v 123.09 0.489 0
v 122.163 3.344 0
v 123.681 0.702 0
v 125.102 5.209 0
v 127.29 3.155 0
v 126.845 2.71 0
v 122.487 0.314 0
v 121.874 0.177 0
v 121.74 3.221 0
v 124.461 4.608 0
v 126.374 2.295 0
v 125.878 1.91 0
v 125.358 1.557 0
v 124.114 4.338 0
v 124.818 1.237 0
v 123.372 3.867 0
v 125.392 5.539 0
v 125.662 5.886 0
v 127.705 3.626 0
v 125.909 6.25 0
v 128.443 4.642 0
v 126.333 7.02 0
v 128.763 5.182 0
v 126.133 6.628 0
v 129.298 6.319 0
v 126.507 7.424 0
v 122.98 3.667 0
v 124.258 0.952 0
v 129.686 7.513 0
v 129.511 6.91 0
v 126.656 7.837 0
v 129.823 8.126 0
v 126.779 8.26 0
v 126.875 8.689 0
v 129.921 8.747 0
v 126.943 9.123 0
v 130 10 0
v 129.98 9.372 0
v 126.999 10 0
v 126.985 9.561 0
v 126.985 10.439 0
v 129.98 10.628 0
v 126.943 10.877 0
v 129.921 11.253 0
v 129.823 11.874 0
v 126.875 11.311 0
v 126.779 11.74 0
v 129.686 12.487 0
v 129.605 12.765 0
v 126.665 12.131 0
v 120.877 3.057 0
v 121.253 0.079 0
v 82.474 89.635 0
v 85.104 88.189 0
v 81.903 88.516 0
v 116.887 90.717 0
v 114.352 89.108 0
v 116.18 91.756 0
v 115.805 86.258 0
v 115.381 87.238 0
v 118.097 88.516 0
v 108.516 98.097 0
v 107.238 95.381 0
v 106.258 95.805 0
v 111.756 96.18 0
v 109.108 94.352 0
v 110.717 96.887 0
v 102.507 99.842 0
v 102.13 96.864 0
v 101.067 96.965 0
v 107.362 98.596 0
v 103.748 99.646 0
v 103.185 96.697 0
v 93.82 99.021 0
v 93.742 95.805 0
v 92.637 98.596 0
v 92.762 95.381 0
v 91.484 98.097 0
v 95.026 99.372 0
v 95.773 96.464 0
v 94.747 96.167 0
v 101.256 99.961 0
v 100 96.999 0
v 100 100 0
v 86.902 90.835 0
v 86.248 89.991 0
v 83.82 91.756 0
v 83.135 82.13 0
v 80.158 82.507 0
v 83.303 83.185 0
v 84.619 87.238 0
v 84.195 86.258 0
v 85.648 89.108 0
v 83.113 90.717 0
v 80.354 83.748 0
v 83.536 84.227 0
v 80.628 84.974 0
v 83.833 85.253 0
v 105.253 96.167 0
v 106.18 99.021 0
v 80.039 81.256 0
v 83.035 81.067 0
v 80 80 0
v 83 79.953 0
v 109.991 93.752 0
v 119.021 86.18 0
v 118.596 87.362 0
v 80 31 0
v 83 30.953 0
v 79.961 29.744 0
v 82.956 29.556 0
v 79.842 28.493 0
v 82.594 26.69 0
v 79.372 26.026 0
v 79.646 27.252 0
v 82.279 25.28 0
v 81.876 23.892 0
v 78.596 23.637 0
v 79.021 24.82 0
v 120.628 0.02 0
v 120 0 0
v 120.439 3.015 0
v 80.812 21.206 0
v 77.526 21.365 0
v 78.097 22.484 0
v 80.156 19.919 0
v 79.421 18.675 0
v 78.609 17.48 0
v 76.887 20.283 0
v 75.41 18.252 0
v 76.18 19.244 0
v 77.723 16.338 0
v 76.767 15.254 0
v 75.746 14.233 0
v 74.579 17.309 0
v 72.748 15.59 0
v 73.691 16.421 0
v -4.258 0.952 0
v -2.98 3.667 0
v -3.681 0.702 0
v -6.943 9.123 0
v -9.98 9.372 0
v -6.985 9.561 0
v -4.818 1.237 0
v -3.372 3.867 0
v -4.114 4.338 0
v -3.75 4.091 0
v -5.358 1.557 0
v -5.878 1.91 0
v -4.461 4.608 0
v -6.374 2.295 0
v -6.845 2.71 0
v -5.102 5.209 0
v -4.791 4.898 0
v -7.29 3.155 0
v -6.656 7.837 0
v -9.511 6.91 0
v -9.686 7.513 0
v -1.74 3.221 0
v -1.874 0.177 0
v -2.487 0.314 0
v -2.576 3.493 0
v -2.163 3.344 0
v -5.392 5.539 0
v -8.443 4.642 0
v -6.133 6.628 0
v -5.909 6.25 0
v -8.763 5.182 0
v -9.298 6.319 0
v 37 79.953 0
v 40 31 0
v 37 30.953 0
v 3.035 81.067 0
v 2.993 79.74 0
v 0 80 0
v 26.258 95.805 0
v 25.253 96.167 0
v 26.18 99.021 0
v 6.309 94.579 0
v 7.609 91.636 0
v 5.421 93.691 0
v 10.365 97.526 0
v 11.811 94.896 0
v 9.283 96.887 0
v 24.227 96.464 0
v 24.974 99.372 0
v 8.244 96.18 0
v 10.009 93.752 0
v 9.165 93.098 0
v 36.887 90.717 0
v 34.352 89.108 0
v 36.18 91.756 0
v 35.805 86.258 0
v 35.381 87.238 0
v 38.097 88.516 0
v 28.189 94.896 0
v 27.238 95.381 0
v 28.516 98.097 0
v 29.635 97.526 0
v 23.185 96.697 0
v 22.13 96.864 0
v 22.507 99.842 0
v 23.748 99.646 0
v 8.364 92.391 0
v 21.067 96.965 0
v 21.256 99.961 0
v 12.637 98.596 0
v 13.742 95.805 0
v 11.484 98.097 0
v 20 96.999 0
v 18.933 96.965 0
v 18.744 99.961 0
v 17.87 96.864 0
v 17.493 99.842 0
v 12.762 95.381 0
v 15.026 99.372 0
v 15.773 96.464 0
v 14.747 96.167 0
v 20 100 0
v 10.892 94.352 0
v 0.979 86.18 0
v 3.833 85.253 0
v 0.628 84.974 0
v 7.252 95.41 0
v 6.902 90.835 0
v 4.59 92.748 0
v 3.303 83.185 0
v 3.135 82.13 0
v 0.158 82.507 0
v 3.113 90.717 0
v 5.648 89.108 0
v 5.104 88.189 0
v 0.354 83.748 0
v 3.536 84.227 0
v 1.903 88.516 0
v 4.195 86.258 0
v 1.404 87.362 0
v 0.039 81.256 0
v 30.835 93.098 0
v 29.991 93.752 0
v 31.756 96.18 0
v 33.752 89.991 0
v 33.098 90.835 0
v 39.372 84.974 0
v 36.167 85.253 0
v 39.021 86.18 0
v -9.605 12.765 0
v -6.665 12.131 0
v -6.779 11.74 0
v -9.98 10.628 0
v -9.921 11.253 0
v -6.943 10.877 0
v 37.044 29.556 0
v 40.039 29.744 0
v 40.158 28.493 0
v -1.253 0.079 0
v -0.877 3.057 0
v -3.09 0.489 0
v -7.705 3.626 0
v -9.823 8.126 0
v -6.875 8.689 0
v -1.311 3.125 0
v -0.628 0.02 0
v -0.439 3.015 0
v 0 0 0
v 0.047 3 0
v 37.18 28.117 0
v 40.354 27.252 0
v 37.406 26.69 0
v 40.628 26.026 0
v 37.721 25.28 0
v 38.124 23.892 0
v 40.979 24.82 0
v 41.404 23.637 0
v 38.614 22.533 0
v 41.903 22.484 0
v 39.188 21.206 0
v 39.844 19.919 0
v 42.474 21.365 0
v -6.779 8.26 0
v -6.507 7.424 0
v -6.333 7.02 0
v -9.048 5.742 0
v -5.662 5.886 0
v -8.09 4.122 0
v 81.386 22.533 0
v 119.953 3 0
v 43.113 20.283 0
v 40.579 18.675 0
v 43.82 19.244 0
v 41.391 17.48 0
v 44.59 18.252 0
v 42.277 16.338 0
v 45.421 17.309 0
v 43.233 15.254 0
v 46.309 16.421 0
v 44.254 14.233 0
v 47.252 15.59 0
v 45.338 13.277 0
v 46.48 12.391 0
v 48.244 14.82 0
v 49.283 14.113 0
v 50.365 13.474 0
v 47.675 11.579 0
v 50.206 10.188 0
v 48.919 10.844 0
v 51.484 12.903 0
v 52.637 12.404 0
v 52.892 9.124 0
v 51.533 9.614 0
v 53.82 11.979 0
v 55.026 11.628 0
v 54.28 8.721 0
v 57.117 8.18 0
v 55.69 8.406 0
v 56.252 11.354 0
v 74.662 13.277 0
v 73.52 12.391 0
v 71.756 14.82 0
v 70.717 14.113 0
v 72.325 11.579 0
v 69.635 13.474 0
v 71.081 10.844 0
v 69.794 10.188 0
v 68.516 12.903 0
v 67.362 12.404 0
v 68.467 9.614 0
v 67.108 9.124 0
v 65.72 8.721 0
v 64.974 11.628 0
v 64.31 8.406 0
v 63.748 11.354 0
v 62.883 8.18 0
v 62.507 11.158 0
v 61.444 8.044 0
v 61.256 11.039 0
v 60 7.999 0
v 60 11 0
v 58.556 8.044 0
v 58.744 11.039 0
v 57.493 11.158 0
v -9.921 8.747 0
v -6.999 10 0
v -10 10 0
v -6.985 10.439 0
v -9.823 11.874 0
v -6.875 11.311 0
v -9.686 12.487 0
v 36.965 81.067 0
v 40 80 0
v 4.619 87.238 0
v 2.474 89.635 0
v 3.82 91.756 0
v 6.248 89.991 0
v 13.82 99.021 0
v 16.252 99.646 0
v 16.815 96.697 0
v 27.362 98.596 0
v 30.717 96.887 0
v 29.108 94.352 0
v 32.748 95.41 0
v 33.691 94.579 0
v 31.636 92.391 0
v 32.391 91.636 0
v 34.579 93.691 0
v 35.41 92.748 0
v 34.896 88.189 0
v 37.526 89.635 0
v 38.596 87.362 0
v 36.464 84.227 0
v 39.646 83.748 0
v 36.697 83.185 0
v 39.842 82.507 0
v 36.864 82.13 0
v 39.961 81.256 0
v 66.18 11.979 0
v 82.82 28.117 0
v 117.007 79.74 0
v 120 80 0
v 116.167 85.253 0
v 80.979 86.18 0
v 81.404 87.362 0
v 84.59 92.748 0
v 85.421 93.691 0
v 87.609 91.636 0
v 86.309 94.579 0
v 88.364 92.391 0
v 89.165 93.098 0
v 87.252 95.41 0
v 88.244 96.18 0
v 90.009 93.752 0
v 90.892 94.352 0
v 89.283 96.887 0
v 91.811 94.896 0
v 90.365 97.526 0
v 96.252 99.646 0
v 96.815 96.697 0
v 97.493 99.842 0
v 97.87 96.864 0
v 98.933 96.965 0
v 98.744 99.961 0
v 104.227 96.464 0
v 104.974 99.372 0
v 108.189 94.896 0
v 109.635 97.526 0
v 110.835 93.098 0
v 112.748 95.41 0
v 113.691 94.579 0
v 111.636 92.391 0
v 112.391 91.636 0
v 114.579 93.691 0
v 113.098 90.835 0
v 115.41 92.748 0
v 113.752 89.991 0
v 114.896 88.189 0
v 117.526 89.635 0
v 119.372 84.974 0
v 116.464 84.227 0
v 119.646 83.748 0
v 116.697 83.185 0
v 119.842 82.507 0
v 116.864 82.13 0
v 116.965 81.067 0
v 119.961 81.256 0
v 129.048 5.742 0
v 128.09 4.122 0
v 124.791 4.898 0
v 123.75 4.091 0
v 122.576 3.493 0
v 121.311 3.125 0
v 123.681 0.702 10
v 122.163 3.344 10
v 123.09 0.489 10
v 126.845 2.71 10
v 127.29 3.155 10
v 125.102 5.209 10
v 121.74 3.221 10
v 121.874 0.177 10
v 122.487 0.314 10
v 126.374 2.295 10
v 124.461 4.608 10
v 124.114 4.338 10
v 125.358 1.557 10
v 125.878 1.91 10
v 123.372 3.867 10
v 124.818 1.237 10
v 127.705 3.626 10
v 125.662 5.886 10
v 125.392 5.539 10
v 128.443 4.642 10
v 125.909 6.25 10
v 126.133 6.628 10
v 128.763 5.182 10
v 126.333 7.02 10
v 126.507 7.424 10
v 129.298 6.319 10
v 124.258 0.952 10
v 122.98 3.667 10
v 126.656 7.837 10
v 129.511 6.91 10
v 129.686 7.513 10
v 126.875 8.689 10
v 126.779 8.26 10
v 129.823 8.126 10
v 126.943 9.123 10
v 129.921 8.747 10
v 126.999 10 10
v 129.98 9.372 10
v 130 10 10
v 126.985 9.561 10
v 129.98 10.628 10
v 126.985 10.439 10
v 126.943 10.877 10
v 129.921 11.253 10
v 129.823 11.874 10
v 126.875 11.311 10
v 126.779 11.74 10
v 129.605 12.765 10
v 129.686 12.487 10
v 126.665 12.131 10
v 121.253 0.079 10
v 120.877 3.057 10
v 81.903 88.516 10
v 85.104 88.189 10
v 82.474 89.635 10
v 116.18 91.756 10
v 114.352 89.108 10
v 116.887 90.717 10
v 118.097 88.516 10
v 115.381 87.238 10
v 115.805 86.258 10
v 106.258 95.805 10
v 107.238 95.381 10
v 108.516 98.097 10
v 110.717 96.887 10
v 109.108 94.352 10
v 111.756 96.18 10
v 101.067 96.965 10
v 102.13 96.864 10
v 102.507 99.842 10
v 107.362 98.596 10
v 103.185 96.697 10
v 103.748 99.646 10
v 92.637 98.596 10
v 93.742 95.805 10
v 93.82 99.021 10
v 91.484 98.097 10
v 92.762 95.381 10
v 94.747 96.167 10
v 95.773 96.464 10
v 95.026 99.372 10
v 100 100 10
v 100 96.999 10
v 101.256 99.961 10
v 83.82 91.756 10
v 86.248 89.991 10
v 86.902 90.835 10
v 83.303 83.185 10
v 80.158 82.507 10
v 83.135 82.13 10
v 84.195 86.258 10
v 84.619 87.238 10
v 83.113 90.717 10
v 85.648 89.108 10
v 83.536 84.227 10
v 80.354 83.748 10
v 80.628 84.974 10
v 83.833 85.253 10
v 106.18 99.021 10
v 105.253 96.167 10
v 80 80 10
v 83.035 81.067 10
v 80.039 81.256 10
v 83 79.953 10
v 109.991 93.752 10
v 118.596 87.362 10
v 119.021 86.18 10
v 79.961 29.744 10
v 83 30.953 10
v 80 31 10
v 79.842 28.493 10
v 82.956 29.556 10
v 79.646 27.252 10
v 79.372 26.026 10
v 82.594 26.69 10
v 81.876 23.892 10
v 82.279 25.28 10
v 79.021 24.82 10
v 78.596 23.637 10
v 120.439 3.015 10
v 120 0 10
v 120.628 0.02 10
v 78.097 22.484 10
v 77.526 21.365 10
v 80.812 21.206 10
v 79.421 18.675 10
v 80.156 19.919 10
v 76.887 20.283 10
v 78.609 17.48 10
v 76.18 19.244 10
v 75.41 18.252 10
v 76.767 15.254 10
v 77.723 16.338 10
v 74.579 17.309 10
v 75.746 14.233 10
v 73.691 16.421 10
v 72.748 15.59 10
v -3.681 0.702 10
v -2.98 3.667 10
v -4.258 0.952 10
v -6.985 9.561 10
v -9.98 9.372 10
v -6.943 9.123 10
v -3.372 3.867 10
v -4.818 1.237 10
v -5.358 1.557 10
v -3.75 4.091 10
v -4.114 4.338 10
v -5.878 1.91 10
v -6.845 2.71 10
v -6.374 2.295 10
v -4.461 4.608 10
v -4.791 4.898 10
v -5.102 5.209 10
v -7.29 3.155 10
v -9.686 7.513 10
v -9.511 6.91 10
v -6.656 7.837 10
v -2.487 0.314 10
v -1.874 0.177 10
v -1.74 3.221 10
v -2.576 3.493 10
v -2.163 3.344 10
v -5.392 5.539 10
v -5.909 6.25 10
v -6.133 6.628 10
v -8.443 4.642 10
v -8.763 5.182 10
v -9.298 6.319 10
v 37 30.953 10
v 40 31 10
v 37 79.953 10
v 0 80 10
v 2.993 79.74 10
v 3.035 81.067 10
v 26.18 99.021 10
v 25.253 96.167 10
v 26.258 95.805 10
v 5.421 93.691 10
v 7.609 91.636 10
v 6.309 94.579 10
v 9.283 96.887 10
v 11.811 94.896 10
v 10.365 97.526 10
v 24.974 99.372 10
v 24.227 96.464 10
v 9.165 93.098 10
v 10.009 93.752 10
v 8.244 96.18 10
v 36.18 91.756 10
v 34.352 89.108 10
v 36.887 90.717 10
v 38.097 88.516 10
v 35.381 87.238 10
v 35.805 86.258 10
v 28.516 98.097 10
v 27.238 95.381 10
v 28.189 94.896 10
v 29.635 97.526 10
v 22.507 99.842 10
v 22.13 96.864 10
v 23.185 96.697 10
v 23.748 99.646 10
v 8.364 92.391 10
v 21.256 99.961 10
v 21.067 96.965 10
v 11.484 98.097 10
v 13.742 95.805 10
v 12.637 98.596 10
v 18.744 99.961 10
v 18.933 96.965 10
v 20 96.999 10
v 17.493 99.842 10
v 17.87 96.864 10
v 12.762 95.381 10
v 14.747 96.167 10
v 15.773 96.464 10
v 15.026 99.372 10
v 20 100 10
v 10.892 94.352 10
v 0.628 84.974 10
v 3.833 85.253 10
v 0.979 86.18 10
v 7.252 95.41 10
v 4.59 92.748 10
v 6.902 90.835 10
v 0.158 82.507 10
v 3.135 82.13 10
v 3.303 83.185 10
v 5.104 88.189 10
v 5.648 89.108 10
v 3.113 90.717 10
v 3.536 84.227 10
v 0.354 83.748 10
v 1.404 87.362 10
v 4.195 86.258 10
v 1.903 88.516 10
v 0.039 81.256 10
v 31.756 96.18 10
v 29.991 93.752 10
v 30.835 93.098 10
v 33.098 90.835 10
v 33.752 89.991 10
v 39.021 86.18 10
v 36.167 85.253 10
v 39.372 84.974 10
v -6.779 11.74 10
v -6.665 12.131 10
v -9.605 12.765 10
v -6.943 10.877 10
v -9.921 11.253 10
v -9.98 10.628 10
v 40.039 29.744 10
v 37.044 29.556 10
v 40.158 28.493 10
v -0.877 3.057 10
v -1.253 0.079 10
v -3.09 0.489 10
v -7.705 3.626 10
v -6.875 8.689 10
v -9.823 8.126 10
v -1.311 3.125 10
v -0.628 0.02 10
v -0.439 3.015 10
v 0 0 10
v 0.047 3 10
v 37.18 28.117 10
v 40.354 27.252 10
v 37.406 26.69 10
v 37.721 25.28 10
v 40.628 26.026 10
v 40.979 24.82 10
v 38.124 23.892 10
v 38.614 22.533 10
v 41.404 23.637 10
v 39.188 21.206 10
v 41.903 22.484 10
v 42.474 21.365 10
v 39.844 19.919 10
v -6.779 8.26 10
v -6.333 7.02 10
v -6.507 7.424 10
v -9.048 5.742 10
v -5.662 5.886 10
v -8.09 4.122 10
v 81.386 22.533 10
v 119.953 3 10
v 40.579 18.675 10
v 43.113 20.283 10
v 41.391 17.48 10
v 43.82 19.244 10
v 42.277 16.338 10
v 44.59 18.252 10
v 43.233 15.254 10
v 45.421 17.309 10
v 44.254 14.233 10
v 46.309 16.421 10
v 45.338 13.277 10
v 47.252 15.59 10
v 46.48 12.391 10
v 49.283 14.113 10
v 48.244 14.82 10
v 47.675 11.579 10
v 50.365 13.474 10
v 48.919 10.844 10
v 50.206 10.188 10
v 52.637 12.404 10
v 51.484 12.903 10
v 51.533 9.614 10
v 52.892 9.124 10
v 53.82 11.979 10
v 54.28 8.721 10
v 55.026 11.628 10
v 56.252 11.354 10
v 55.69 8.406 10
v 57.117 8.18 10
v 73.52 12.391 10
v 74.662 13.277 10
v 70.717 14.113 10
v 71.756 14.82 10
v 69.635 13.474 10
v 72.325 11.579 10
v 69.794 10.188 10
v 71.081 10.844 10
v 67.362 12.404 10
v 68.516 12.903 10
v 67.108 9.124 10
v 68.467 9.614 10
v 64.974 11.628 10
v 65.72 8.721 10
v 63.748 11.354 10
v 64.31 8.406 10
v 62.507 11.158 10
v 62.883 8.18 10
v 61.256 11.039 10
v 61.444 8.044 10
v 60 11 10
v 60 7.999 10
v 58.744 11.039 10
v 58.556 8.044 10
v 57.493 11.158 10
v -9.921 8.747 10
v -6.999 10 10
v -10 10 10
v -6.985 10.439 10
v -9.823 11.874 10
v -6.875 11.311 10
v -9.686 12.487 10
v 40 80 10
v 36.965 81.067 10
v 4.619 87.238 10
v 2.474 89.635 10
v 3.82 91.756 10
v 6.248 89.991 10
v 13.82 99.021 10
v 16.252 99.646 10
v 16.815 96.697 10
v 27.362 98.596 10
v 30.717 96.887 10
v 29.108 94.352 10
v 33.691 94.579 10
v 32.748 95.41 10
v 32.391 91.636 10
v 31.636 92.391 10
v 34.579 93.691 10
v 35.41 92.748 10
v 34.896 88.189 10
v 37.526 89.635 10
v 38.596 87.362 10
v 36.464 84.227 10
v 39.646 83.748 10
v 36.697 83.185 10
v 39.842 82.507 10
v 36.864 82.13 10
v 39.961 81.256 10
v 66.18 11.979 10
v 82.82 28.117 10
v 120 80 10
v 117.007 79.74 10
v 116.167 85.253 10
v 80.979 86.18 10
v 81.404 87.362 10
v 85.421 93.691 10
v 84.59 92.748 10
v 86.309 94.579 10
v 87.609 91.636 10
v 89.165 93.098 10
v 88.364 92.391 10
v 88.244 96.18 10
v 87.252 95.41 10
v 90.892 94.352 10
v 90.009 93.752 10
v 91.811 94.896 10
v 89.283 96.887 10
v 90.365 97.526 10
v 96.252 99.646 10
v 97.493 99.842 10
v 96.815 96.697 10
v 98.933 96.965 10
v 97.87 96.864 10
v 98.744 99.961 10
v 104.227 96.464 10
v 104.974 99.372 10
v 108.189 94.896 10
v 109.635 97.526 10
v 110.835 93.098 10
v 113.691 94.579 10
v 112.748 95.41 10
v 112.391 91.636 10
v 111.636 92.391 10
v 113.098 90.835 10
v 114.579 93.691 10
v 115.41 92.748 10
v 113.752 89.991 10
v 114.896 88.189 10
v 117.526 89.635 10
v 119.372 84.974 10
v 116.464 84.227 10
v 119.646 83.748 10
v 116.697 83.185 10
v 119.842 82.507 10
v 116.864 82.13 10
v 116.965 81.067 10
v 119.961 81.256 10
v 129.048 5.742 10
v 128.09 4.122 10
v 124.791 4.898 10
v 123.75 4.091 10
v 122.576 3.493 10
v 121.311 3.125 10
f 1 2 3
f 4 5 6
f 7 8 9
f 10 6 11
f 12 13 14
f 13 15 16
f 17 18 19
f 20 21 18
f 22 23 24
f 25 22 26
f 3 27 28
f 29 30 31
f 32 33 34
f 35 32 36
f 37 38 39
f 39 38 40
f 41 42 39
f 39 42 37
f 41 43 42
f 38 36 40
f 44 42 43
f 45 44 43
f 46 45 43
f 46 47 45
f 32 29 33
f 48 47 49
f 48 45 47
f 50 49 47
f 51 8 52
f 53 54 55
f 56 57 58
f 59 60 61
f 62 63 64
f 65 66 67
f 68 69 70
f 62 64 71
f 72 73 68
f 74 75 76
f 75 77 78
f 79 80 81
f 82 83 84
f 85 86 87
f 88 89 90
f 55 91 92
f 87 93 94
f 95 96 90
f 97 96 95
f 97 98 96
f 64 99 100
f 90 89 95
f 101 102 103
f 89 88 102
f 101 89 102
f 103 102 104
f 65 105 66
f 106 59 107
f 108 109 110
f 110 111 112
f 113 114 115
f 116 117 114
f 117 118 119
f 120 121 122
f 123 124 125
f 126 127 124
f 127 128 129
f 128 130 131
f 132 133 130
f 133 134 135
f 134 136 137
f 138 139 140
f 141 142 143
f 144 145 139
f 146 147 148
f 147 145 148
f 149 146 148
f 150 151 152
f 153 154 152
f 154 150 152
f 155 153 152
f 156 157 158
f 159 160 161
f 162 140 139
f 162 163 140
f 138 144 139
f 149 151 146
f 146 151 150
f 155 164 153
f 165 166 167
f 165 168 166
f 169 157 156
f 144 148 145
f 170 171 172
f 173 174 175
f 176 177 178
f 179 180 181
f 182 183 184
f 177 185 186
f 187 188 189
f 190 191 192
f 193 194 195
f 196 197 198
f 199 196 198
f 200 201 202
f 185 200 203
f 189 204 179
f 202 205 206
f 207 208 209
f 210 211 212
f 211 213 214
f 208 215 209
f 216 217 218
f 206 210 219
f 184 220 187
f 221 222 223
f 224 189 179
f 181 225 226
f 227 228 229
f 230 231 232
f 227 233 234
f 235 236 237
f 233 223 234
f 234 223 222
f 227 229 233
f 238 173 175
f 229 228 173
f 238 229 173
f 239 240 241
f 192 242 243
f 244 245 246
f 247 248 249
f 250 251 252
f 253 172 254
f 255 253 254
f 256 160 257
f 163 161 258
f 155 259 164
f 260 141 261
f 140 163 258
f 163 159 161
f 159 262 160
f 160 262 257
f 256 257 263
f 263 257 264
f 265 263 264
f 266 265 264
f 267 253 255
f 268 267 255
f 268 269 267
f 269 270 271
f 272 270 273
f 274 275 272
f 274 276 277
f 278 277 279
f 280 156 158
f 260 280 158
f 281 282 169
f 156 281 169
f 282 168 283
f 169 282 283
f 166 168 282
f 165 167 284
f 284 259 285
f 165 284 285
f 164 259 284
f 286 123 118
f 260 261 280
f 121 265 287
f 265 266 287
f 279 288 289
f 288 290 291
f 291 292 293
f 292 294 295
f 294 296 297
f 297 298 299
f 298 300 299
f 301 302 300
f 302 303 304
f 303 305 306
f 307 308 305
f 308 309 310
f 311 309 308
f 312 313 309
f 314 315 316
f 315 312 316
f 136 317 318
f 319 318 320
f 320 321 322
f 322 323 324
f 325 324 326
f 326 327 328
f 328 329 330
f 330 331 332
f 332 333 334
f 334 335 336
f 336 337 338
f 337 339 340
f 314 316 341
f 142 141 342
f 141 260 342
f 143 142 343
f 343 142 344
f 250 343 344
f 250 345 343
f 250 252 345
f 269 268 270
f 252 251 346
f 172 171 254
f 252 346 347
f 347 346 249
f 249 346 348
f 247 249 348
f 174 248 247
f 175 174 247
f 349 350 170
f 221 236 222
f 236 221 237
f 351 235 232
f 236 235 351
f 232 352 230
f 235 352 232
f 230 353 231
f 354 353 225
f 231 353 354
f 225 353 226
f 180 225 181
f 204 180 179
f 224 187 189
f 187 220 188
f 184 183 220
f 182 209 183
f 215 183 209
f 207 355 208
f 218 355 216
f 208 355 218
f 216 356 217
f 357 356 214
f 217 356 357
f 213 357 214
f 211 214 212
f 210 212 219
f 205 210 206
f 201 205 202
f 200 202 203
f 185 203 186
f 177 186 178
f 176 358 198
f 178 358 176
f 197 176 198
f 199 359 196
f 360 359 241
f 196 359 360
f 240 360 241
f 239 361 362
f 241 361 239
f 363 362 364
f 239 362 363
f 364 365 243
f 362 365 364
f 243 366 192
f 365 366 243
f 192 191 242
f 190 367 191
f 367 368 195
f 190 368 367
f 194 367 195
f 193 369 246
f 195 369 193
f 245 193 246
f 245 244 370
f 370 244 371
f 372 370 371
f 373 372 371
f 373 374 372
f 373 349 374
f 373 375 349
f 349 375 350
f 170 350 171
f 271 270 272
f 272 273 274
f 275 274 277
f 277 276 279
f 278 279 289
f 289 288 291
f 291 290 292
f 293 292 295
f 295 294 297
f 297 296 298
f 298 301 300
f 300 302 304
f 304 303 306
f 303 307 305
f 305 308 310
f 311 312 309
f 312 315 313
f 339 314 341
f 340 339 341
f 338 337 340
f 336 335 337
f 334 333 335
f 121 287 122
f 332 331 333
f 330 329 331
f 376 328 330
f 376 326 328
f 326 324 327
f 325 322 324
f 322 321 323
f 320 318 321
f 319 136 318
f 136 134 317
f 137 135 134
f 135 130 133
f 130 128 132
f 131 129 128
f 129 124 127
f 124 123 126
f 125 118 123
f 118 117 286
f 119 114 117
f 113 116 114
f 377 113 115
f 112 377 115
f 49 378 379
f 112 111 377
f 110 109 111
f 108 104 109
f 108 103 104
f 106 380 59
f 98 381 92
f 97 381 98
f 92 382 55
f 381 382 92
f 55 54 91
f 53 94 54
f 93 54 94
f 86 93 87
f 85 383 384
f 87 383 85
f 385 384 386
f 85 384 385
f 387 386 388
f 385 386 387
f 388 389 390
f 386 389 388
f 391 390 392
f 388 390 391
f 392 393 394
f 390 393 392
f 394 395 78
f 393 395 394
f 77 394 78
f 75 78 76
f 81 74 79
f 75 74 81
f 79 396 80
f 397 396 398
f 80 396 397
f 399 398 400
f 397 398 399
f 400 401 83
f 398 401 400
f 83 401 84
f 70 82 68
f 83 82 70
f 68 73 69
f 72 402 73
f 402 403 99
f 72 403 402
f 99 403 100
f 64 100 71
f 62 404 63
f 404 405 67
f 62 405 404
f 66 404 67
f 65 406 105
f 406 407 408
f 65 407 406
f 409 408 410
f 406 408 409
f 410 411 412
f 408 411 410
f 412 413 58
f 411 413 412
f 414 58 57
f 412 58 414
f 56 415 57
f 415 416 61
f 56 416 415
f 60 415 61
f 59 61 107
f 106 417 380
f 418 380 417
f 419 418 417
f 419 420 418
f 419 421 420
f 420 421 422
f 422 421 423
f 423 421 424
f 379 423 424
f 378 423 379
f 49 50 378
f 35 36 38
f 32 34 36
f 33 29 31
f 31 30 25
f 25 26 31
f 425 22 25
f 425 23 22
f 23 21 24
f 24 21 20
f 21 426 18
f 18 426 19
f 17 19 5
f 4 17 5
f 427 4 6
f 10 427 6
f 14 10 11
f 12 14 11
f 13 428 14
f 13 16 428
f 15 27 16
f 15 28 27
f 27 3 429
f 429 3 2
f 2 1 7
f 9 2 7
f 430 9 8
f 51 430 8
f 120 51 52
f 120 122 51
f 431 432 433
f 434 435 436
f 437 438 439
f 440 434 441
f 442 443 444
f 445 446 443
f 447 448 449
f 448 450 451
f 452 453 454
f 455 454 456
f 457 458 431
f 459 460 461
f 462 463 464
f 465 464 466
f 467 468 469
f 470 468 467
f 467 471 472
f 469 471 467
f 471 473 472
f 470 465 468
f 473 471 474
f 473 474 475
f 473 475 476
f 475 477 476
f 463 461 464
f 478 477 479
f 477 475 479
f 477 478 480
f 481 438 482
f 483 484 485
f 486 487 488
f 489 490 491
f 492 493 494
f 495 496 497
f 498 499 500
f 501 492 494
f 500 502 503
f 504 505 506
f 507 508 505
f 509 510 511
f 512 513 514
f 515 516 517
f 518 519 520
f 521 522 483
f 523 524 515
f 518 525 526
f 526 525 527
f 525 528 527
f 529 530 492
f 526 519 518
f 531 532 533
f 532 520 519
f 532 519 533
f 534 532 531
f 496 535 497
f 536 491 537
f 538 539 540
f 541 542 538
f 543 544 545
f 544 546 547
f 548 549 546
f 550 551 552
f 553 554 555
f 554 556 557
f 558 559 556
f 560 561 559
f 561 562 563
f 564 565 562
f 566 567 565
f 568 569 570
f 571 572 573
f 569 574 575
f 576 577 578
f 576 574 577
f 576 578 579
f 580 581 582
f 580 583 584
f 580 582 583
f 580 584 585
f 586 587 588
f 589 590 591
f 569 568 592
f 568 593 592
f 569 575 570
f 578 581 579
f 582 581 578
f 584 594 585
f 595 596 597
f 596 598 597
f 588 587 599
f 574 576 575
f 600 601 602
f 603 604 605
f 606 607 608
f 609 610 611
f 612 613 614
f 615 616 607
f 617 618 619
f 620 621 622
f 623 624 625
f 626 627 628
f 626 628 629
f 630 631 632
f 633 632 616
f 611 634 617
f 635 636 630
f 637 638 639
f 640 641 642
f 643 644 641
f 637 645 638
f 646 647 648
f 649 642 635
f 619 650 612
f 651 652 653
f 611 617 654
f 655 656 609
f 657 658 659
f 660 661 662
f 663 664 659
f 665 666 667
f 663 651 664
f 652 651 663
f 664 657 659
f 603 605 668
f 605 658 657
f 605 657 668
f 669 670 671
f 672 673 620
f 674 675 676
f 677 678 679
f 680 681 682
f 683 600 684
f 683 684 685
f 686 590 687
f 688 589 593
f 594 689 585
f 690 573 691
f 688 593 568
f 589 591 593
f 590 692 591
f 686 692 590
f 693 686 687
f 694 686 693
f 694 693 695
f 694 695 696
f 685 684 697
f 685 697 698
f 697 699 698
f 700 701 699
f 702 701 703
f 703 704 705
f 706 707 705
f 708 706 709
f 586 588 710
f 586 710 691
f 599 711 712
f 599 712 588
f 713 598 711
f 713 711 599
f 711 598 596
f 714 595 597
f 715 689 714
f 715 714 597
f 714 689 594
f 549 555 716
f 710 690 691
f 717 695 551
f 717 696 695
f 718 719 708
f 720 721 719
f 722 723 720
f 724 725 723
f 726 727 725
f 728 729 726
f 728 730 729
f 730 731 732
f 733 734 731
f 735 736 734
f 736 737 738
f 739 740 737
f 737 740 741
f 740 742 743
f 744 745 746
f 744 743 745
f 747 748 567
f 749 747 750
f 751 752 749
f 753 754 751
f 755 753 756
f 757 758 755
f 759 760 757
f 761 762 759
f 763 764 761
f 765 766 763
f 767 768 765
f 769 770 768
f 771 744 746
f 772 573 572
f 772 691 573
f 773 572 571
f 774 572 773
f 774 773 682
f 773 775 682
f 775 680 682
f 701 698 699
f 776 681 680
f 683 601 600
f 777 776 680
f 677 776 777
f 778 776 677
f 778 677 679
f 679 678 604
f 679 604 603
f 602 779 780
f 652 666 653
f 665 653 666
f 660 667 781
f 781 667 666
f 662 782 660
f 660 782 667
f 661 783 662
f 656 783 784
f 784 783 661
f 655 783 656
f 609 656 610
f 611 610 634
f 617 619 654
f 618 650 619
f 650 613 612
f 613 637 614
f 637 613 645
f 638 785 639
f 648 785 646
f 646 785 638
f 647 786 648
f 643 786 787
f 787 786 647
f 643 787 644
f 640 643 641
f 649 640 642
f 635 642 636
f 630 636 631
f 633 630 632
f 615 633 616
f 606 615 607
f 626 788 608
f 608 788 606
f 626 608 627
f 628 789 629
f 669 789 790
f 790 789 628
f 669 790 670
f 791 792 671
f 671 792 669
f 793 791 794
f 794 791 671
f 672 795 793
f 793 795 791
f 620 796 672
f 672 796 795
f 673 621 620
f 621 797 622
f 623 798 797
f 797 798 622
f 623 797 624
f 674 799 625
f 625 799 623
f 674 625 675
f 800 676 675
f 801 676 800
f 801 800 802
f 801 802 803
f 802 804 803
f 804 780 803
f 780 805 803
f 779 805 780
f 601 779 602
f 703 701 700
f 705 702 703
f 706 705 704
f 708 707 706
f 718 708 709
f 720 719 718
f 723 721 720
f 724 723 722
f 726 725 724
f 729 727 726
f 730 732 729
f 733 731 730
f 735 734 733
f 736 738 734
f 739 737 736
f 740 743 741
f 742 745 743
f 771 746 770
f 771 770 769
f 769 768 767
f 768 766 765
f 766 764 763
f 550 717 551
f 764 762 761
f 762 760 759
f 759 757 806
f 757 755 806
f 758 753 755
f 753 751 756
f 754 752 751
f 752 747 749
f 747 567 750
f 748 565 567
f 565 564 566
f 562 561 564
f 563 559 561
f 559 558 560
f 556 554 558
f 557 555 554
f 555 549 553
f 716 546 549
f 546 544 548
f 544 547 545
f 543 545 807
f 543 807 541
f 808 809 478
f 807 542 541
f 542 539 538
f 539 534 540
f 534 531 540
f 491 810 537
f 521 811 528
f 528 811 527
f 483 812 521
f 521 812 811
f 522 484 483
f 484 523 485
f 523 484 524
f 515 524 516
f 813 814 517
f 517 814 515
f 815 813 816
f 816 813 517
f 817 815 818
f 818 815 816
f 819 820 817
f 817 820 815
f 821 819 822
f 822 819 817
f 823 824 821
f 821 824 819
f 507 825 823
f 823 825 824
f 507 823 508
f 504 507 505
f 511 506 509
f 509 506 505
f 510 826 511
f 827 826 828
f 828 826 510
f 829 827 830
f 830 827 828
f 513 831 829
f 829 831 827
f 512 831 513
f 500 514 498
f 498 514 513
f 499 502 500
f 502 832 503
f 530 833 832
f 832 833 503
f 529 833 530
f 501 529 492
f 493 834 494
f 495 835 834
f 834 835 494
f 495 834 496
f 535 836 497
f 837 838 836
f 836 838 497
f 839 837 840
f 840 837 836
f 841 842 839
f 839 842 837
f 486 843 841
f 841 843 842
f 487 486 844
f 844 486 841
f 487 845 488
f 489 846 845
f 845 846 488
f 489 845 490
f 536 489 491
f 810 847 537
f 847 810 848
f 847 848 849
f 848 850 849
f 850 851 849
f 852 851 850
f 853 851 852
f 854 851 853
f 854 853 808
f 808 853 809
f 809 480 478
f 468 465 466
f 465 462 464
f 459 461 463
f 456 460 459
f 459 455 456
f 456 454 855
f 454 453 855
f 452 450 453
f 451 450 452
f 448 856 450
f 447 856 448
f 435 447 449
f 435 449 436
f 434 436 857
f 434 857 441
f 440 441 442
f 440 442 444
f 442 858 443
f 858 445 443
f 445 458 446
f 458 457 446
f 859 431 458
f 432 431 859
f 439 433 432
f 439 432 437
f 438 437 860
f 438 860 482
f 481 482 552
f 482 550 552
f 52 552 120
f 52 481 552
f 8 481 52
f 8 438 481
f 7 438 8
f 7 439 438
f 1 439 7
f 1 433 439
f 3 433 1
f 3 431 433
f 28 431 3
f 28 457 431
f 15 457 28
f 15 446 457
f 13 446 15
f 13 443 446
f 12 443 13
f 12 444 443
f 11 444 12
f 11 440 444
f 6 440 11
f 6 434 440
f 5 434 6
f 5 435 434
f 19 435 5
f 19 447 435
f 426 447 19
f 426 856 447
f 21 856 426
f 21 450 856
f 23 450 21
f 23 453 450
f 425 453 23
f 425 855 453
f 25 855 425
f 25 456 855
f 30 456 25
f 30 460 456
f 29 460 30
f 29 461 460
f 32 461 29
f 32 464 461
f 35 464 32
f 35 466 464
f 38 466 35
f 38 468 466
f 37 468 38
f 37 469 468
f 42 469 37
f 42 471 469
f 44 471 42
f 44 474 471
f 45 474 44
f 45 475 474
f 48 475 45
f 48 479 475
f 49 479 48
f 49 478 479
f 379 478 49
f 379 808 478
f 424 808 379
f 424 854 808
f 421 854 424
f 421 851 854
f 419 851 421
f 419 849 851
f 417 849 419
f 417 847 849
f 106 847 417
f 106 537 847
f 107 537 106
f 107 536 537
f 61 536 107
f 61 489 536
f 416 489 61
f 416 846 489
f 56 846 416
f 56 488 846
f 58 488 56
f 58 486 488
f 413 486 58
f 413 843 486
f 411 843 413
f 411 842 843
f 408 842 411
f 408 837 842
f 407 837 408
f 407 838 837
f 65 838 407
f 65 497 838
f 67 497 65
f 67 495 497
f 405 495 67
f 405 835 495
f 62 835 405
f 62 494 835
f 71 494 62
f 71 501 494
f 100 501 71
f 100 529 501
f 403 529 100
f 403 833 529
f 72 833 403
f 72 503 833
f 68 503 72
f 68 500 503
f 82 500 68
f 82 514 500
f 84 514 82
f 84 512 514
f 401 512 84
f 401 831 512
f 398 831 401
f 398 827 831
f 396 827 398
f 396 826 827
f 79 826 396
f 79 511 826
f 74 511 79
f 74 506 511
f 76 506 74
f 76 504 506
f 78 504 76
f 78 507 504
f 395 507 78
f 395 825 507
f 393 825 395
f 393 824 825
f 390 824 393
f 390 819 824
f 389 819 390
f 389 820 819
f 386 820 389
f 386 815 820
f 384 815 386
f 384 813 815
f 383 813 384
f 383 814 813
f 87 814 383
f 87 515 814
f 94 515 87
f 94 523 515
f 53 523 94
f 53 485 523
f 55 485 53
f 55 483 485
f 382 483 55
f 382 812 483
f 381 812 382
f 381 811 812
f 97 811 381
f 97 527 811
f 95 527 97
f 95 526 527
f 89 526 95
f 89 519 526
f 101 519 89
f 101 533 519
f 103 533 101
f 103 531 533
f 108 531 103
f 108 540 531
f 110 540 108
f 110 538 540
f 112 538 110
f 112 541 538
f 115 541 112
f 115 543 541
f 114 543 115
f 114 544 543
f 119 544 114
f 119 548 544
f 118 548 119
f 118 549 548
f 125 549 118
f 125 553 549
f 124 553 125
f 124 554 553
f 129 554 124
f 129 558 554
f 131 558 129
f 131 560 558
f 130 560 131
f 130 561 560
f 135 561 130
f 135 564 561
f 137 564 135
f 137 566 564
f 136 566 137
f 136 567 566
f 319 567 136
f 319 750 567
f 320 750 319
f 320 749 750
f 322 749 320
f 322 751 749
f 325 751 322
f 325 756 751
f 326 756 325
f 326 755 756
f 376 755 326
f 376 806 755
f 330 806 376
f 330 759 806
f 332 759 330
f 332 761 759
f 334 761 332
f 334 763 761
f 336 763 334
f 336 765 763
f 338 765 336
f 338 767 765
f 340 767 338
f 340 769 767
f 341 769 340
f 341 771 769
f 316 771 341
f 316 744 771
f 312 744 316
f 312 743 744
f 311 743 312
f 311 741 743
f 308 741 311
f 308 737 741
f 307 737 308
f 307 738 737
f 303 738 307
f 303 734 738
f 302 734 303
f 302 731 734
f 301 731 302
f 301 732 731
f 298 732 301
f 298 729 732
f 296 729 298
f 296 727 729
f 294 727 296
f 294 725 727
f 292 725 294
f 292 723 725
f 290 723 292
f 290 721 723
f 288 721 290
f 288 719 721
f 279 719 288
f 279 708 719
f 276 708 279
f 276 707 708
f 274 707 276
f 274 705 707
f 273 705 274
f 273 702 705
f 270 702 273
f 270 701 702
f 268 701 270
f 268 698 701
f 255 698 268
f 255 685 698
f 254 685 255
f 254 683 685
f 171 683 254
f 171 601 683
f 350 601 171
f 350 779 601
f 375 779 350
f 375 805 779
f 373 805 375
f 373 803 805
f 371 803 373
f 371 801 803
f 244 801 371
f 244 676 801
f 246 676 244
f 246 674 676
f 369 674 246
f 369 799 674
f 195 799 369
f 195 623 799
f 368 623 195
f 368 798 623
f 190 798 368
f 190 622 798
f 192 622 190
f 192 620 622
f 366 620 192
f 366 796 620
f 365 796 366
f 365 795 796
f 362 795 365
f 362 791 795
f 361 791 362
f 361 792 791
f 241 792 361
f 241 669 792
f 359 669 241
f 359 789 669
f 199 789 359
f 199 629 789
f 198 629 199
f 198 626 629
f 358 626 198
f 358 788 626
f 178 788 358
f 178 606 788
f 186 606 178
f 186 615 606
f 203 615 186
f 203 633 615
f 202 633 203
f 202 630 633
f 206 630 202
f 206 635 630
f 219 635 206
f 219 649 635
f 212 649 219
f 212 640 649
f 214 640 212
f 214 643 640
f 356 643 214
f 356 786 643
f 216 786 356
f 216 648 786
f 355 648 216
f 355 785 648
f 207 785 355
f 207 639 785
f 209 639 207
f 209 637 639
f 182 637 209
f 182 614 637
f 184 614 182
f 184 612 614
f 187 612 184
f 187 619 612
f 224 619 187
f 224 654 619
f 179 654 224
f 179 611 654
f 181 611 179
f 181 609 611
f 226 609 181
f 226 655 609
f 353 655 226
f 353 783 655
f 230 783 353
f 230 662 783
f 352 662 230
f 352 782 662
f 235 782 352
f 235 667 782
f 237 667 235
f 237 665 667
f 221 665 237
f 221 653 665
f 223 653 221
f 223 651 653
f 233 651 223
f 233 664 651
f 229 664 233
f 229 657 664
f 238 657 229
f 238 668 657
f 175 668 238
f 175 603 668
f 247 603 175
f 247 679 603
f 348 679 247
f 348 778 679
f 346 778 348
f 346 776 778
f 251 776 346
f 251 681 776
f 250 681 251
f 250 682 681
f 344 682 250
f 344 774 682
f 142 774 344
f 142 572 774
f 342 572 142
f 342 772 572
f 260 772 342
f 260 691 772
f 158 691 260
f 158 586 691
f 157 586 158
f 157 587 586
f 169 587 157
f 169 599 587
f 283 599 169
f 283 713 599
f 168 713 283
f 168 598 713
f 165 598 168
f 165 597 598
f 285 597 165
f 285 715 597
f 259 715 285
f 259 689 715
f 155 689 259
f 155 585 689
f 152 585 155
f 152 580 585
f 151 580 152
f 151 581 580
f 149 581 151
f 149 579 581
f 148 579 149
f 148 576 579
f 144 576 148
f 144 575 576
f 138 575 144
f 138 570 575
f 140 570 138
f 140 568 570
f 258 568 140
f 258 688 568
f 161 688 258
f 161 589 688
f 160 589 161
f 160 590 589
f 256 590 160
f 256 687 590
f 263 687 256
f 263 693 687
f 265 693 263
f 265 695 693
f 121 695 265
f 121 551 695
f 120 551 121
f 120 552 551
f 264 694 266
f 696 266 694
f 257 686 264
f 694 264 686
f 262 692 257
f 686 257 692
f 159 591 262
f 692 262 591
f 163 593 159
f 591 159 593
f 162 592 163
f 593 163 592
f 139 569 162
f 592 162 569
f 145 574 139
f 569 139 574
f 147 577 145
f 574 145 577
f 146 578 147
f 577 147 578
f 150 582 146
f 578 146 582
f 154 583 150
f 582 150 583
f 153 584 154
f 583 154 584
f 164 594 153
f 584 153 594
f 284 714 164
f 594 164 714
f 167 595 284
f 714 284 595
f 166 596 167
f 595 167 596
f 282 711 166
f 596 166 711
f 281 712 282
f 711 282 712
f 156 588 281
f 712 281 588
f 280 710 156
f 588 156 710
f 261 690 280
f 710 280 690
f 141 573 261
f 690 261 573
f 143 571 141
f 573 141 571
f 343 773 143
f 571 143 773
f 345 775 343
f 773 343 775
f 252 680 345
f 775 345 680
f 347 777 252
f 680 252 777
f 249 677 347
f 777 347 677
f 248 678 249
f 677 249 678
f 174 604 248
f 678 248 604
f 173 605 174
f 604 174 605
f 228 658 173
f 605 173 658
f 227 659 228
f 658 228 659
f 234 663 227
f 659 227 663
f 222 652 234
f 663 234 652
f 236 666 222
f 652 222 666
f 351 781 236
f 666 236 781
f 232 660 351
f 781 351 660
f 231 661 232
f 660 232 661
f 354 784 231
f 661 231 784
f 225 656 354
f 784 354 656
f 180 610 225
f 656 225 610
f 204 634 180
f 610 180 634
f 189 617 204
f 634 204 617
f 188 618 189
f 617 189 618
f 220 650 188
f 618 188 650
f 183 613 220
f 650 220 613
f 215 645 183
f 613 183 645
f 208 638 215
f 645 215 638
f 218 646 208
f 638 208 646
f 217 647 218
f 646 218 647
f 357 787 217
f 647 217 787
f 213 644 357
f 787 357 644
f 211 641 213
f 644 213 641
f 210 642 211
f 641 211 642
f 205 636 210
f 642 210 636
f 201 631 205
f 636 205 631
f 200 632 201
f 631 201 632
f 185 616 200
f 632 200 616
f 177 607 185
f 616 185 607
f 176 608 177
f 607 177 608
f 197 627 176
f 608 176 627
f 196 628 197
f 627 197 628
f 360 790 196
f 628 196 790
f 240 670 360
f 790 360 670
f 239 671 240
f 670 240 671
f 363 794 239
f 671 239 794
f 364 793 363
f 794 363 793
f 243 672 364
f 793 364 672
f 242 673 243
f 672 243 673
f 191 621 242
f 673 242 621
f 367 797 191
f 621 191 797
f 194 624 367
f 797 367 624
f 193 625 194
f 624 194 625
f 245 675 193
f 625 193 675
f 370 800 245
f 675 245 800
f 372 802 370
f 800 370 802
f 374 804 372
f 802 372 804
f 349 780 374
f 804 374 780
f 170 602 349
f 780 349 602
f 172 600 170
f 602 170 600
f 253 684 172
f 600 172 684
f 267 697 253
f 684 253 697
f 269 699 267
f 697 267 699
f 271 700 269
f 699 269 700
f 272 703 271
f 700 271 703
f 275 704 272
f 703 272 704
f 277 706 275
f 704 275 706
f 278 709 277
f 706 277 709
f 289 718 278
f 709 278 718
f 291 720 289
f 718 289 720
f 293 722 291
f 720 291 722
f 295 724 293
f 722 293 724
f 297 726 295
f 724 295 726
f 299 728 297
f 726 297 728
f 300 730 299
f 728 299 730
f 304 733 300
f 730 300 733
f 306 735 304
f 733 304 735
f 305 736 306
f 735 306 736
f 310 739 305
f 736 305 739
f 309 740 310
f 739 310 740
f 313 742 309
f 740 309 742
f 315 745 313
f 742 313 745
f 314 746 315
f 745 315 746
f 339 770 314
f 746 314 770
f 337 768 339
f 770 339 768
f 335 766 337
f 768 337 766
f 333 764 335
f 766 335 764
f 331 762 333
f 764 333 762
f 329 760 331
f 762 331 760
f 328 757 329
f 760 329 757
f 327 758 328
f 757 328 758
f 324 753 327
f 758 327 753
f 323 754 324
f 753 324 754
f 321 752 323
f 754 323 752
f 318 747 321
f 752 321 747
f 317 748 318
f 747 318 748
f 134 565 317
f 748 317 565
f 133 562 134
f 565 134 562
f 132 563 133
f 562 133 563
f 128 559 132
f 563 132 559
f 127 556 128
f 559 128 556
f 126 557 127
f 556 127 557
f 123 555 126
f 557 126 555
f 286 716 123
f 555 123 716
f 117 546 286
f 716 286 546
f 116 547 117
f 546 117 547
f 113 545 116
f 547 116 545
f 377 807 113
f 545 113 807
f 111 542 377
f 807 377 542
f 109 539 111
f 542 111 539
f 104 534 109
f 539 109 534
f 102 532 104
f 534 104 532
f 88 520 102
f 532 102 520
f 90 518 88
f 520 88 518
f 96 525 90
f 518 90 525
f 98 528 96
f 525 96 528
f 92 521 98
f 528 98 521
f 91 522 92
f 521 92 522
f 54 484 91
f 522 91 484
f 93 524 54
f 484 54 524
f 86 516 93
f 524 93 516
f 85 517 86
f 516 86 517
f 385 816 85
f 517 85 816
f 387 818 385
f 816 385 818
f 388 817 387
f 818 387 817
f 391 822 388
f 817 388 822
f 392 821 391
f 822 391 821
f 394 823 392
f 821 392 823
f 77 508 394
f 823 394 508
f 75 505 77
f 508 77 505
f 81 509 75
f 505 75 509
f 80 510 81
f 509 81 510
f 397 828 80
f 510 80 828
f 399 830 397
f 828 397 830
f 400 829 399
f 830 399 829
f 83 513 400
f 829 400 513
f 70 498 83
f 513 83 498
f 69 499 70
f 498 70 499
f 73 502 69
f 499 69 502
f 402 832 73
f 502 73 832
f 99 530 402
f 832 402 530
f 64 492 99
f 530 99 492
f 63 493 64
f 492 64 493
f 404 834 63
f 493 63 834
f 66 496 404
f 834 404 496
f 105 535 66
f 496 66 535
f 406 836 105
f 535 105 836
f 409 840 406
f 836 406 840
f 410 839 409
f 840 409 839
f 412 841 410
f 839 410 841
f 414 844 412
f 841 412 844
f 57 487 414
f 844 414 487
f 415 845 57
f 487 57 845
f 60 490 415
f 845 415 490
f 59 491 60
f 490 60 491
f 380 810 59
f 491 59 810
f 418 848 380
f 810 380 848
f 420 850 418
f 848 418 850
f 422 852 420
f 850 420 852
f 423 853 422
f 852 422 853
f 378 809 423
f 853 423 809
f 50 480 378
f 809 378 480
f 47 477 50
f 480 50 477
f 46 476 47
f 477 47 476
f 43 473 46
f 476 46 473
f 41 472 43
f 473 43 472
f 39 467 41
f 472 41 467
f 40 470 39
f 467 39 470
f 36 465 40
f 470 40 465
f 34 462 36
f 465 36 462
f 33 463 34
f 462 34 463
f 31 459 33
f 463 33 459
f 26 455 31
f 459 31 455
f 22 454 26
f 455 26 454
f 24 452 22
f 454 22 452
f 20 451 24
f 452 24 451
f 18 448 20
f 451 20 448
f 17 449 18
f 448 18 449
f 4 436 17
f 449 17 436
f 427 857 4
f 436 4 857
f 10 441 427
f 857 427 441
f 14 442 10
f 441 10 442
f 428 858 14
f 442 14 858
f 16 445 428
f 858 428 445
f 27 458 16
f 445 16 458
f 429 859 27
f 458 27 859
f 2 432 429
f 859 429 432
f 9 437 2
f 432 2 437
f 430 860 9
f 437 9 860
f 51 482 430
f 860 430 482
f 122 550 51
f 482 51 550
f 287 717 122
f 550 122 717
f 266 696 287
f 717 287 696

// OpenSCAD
z = 10;
bh = 100; // height
tw = 120; // top width
thick = 3.0;
buf = 5 + 2*thick;

// bottom and top radius
br = 10;
tr = tw/6;

module bumper_filled() {
     difference() {
	  union() {
	       translate([tr,bh-tr]) circle(r=tr);
	       translate([tw-tr,bh-tr]) circle(r=tr);

	       translate([0,br]) circle(r=br);
	       translate([tw,br]) circle(r=br);

	       polygon(points=[
			    [0,0], [-br,br], [0,bh-tr],
			    [tw,bh-tr], [tw+br, br], [tw,0]]);

	  }
	  translate([tw/2,buf+tr]) circle(r=tr);
	  translate([2*tr,buf+tr]) square([2*tr, bh-tr]);
     }
}


module bumper_hull() {
     difference() {
	  bumper_filled();
	  offset(delta=-thick, $fn=100) bumper_filled();
     }
}

linear_extrude(z, $fn=100) bumper_hull();
